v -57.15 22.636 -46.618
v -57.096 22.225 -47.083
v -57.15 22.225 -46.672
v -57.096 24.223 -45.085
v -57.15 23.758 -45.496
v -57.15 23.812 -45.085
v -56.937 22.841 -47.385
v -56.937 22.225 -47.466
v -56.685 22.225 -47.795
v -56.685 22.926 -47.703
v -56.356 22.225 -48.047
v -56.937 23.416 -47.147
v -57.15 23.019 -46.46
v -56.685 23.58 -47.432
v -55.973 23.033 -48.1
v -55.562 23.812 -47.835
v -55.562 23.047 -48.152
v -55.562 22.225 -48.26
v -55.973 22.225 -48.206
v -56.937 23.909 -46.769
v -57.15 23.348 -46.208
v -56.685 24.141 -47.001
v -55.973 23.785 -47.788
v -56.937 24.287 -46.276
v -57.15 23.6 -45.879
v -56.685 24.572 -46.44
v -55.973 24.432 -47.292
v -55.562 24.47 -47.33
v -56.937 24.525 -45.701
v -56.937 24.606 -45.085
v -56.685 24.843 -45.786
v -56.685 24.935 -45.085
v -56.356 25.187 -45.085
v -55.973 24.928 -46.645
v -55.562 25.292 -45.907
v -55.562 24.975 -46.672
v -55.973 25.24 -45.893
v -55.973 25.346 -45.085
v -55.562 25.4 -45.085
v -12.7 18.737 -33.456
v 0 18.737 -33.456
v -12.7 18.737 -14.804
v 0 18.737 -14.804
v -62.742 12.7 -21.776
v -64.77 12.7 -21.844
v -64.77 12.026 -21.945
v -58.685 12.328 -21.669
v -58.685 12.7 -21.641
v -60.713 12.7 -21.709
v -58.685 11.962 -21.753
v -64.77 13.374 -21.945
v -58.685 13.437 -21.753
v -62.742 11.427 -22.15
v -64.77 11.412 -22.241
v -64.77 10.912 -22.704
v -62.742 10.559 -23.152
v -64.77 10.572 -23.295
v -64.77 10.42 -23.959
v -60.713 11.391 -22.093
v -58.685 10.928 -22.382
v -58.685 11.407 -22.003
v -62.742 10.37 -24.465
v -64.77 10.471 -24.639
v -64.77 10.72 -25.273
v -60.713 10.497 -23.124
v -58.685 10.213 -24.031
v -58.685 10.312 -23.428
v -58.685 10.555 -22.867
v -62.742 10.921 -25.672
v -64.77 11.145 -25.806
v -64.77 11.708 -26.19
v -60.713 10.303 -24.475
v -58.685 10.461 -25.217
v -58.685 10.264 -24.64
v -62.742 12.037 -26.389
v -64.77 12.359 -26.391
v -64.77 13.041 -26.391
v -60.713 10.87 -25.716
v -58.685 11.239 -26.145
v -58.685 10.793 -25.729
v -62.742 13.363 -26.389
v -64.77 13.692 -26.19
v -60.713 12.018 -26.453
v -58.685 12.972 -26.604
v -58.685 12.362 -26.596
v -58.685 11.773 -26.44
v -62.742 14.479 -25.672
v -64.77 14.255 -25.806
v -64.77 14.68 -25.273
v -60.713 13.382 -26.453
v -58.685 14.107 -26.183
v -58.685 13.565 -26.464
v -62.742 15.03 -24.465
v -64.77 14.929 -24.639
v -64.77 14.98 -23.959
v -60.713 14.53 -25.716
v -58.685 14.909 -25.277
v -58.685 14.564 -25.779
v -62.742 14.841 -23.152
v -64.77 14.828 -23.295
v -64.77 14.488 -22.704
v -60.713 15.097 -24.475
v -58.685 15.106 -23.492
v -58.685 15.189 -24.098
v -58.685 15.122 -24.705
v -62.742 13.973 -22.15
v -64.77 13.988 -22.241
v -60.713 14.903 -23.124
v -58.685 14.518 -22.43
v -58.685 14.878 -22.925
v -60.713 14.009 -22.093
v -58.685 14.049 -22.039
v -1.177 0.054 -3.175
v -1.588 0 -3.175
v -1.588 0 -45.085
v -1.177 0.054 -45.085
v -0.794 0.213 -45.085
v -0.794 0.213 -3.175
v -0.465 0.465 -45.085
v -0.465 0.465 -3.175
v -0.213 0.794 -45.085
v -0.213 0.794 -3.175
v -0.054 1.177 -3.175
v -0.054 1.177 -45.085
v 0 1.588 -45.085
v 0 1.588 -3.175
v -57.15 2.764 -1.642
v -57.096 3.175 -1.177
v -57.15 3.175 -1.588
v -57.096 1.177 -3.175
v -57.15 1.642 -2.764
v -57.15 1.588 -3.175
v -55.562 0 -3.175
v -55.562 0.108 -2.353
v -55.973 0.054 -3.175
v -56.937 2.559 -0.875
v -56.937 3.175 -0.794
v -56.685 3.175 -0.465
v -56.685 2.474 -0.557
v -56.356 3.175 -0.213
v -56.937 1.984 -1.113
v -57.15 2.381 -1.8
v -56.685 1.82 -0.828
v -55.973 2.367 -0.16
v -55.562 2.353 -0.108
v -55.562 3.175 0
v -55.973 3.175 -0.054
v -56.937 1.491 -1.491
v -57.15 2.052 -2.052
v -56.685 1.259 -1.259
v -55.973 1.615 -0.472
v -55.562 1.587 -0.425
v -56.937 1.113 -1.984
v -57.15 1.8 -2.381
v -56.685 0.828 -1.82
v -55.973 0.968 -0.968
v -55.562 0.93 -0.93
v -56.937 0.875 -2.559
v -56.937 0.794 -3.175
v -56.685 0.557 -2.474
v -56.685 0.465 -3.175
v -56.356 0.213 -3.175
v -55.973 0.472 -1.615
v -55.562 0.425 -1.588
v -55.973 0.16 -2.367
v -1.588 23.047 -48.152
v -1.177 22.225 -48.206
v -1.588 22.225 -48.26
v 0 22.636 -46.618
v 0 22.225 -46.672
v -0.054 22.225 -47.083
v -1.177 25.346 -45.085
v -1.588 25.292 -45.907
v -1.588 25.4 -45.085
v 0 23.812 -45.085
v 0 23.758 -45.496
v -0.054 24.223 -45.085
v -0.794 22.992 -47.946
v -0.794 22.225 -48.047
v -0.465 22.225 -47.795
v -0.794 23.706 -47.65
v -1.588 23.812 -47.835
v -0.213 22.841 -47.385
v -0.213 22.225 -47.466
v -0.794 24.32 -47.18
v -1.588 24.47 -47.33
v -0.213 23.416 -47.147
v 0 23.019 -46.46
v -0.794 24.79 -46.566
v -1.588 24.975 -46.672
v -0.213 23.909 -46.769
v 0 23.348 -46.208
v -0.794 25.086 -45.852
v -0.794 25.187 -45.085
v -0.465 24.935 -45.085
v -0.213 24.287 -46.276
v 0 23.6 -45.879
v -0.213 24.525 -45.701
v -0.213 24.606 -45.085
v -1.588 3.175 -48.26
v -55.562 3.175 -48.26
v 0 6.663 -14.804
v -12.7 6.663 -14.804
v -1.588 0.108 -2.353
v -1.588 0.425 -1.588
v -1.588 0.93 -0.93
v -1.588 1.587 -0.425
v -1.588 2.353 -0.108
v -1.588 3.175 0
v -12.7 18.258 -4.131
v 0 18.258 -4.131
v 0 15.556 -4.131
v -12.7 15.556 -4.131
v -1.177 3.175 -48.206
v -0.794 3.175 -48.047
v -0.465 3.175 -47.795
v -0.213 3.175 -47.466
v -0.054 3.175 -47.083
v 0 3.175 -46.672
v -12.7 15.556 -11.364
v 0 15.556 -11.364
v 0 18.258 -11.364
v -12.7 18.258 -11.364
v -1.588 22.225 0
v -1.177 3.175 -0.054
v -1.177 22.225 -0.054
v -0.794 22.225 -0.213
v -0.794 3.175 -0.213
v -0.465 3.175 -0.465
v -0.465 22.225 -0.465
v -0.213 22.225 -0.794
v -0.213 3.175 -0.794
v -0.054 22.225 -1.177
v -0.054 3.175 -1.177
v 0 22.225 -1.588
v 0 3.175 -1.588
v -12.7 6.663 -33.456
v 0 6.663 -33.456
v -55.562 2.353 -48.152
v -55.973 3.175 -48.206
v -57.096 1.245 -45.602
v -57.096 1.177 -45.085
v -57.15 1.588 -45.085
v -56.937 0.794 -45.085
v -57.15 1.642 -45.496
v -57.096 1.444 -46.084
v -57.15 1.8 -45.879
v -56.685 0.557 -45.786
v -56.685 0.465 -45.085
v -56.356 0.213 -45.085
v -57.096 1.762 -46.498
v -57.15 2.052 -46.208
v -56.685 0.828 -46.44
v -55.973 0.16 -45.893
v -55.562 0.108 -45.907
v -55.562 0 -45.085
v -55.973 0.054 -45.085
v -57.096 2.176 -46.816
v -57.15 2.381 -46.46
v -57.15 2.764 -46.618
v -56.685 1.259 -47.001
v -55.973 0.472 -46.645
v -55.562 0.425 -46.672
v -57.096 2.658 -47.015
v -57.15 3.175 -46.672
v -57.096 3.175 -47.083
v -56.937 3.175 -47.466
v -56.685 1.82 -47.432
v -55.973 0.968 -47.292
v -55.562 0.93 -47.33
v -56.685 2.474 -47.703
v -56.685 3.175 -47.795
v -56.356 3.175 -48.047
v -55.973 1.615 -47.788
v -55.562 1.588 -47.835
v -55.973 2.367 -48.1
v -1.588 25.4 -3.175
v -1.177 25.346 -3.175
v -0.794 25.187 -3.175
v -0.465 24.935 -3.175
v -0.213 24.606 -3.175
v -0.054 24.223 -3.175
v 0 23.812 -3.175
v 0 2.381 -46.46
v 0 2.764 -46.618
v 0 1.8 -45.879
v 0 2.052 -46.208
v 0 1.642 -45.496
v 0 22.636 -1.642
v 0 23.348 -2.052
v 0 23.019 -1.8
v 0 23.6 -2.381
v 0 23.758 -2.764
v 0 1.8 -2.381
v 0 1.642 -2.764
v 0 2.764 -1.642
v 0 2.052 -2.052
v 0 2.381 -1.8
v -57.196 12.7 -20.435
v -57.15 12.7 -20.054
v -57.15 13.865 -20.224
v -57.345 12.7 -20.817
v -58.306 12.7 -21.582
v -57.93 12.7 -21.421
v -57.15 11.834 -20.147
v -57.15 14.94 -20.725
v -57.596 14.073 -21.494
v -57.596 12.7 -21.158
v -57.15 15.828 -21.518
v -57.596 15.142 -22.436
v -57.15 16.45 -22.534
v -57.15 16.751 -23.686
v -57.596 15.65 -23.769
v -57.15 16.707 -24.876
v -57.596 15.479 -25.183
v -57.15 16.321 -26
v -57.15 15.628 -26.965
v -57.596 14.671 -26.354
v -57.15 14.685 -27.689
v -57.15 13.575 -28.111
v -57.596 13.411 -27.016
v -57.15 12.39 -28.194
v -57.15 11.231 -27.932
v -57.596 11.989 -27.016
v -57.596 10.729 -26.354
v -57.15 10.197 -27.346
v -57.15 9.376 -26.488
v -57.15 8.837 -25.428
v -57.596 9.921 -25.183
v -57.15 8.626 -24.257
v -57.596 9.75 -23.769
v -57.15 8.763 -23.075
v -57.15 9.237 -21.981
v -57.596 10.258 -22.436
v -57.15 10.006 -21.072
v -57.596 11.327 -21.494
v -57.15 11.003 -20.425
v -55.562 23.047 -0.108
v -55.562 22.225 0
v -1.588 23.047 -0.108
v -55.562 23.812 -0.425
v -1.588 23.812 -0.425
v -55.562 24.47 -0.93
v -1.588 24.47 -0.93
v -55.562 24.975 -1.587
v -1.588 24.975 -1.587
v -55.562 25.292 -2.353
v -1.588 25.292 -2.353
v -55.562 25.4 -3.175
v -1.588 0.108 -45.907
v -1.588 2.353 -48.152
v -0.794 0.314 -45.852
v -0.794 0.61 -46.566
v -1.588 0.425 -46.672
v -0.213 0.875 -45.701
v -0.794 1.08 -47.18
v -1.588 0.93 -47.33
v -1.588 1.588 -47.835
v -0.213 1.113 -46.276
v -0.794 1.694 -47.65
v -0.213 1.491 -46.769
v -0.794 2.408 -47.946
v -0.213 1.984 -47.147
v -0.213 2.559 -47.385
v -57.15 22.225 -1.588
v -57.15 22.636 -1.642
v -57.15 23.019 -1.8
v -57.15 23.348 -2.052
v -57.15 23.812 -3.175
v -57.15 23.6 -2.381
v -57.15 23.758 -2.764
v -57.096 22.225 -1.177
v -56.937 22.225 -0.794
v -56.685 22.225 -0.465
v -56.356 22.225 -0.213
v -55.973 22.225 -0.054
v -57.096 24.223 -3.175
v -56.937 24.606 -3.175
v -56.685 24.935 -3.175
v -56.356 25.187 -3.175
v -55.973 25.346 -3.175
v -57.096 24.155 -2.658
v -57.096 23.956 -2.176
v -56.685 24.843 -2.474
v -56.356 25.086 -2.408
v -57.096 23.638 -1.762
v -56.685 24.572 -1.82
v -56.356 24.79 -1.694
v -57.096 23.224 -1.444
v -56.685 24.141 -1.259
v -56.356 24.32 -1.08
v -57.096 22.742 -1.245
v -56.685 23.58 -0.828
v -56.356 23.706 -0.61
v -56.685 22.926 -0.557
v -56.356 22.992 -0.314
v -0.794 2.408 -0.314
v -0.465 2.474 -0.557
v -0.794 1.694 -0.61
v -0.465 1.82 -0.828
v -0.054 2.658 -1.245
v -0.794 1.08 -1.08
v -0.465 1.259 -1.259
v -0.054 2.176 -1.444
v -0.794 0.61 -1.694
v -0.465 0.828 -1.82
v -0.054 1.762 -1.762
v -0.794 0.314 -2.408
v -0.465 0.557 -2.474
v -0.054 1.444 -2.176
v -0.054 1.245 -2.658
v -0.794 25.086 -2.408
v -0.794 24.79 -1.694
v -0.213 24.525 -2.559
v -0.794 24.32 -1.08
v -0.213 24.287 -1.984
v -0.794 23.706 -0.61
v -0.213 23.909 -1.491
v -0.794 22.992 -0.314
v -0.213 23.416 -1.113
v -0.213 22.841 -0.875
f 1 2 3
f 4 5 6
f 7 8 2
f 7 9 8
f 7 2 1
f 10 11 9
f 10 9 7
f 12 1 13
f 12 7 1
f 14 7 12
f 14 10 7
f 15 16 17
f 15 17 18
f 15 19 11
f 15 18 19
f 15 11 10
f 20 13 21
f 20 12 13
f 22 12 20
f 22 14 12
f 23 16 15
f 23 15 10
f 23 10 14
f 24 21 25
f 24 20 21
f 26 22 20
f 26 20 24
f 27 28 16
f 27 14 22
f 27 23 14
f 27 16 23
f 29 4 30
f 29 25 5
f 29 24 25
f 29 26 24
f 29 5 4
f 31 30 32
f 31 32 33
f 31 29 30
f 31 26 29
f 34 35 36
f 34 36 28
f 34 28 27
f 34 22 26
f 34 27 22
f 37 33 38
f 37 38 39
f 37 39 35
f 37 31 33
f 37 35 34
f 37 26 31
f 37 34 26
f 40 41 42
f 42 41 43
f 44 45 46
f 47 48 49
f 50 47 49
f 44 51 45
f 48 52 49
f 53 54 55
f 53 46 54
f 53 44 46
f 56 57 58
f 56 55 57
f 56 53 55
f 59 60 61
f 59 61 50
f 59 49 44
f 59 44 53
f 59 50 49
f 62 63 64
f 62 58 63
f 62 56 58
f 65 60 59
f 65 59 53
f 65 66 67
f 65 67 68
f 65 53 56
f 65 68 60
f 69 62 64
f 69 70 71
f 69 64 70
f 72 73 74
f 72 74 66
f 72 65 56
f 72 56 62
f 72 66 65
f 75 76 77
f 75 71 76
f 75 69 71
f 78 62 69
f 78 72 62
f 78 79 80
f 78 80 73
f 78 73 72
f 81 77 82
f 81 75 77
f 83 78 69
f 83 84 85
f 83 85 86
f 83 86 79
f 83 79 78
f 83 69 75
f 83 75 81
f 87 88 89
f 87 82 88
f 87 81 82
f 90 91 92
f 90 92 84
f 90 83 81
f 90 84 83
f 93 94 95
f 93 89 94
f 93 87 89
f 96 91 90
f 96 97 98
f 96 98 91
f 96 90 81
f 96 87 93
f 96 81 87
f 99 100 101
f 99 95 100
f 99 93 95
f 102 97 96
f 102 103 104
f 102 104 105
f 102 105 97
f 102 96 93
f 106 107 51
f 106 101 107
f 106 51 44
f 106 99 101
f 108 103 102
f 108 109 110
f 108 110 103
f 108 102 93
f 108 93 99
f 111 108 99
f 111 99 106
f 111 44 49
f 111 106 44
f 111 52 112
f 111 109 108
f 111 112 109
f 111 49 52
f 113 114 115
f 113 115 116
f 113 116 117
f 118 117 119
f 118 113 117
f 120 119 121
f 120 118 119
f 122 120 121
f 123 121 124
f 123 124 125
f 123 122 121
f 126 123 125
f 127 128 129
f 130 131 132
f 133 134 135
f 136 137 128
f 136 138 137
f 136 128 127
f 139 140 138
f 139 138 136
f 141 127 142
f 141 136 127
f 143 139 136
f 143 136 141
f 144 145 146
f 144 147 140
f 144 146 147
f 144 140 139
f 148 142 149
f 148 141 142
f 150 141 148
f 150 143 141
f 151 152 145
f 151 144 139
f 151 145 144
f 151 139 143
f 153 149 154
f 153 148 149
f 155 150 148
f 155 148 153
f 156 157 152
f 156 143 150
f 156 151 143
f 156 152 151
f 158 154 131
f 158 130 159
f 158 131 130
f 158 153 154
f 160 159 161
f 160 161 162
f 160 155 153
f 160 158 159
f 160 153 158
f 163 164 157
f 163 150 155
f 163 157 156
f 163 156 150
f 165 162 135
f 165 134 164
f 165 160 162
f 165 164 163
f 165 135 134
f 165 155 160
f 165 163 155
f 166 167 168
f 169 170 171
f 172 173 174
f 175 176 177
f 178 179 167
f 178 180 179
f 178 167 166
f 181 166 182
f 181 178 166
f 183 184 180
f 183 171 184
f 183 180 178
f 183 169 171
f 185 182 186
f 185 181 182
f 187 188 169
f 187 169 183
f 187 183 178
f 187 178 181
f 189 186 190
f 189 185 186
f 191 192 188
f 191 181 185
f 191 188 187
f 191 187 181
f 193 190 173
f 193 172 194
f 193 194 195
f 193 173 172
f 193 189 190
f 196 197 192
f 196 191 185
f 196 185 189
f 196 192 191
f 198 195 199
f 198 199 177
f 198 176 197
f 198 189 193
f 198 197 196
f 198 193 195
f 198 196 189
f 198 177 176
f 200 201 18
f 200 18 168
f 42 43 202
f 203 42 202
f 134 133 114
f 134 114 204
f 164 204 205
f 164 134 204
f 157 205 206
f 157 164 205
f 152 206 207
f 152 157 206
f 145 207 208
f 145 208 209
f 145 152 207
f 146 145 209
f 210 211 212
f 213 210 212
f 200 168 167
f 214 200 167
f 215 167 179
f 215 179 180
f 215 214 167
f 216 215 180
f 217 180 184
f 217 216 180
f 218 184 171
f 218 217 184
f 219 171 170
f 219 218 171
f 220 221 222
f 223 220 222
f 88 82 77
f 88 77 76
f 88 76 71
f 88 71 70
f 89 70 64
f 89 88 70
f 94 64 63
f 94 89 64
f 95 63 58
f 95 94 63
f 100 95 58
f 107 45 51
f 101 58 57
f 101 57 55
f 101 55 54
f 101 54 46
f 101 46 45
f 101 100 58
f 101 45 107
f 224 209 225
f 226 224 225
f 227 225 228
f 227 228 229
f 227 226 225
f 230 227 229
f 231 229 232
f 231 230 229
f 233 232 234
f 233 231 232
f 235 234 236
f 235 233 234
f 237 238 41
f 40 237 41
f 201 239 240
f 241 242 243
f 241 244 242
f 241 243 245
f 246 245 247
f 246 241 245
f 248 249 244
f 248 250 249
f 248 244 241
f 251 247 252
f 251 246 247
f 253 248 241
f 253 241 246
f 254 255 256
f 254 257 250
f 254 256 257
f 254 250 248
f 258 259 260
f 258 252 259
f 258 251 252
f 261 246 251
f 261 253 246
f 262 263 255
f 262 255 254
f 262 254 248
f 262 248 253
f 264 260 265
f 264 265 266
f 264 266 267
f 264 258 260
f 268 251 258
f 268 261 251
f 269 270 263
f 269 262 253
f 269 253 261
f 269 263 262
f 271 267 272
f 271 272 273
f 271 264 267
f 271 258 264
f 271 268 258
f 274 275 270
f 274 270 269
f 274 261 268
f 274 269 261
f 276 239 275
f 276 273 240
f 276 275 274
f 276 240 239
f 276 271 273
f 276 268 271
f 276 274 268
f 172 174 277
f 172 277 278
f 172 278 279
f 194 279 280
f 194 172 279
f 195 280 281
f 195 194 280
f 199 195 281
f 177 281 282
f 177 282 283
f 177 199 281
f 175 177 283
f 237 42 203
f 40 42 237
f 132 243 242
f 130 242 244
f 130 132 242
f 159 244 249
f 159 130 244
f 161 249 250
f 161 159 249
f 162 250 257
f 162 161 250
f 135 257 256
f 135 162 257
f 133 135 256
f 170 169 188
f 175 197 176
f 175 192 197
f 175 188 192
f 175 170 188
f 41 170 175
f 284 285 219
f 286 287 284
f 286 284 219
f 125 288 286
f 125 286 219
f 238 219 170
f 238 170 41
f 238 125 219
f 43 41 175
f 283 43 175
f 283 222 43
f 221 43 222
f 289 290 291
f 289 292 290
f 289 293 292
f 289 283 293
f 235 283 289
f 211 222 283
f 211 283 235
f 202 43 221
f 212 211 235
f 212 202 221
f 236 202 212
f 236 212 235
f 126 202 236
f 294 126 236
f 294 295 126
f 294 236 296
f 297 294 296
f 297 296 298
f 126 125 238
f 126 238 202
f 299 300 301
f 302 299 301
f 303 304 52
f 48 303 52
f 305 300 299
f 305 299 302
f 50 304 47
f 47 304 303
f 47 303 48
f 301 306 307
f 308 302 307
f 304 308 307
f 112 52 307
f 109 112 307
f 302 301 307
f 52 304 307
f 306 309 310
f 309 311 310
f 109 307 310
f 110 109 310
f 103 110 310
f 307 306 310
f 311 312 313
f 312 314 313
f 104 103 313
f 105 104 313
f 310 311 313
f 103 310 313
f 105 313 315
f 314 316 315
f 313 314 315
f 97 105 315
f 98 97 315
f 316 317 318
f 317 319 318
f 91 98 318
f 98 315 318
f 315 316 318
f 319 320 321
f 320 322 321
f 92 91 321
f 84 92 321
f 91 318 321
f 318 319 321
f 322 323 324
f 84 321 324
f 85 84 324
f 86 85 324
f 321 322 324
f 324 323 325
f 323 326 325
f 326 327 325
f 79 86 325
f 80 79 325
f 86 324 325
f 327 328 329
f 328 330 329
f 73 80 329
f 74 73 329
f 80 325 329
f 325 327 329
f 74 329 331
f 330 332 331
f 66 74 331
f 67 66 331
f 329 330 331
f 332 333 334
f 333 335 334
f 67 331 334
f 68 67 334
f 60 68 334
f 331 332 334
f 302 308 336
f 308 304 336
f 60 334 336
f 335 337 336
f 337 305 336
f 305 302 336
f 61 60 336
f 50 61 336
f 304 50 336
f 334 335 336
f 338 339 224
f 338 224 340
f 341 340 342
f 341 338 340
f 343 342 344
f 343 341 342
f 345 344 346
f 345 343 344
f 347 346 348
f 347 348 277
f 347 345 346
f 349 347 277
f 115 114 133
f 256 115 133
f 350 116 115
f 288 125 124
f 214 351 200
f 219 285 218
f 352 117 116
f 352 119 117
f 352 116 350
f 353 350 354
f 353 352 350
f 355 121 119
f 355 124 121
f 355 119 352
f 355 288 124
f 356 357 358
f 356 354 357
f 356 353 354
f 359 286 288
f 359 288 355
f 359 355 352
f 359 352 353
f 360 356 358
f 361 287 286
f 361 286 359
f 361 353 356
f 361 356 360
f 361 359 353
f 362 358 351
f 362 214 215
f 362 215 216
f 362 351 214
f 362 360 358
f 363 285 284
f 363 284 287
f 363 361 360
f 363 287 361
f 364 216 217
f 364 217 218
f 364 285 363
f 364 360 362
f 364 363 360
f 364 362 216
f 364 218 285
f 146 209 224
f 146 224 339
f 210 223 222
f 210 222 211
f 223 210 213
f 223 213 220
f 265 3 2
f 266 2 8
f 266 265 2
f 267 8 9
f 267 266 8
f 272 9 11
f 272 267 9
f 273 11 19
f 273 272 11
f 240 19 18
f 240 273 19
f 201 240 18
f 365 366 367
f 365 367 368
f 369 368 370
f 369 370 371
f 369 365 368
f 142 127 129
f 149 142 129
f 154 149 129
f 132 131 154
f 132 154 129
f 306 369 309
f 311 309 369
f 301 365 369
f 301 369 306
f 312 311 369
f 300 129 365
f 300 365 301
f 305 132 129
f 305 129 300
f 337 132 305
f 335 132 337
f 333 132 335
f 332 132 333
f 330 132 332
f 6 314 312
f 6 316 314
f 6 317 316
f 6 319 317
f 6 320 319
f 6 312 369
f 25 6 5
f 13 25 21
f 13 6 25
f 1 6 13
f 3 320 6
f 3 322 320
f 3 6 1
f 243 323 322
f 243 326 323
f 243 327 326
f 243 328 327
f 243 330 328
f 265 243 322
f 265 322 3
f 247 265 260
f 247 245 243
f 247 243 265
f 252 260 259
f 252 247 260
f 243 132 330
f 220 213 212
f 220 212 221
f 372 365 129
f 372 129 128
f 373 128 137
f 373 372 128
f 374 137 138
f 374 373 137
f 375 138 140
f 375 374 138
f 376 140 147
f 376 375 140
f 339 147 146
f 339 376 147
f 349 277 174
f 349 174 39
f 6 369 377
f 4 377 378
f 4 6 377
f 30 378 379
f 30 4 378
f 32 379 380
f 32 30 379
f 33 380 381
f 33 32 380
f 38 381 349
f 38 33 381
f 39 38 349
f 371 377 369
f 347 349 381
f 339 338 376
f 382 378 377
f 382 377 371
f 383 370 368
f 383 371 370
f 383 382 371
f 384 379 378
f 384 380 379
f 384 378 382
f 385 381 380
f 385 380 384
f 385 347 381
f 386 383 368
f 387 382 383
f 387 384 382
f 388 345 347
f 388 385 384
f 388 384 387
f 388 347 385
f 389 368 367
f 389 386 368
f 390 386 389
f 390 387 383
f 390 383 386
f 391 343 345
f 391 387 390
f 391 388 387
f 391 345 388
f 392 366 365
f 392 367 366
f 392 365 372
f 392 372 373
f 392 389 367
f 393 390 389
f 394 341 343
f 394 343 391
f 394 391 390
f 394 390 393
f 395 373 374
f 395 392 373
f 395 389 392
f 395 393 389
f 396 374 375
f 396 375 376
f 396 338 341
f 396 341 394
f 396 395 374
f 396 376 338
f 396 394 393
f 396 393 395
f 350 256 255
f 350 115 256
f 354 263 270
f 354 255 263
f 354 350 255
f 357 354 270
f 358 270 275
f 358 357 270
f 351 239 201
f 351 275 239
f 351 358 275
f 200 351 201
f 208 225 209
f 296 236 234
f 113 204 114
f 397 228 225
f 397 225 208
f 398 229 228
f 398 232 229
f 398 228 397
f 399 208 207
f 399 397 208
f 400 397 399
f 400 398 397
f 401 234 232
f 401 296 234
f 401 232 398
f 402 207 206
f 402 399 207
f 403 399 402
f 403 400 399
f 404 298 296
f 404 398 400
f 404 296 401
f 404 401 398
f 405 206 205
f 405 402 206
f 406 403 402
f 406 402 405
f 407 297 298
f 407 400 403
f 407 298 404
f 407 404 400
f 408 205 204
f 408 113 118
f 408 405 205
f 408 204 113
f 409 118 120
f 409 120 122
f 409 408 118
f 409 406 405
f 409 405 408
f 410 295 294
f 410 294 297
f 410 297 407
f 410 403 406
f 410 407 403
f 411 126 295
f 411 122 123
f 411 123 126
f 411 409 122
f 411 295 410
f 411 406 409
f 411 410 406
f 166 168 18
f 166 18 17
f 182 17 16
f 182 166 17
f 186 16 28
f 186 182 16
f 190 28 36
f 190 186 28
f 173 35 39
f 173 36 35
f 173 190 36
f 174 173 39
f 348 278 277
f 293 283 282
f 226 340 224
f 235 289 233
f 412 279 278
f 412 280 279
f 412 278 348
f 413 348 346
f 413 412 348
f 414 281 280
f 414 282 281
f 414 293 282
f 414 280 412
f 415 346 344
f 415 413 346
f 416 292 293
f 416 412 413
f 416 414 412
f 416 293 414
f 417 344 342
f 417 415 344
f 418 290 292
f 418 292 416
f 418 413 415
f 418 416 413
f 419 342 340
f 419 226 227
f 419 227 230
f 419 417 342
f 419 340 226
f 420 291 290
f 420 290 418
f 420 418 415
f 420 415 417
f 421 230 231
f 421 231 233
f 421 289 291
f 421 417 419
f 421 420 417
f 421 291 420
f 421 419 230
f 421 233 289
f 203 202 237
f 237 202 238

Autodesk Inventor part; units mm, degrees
ref_plane "YZ Plane" through (0, 0, 0) normal (1, 0, 0) x (0, 1, 0)
ref_plane "XZ Plane" through (0, 0, 0) normal (0, 1, 0) x (-1, 0, 0)
ref_plane "XY Plane" through (0, 0, 0) normal (0, 0, 1) x (1, 0, 0)
sketch "Sketch1" plane through (0, 0, 0) normal (0, 1, 0) x (-1, 0, 0)
  line L0 (0, 0) -> (57.15, 0)
  line L1 (57.15, 0) -> (57.15, -48.26)
  line L2 (57.15, -48.26) -> (0, -48.26)
  line L3 (0, -48.26) -> (0, 0)
  dimension "d0" = 57.15
  dimension "d1" = 48.26
extrude "Extrusion1" add sketch "Sketch1" along normal blind 25.4
sketch "Sketch2" plane through (0, 0, 0) normal (1, 0, 0) x (0, 0, -1)
  line L0 (0, 0) -> (48.26, 0) construction
  line L1 (48.26, 0) -> (48.26, 25.4) construction
  line L2 (0, 25.4) -> (48.26, 25.4) construction
  line L3 (0, 0) -> (0, 25.4) construction
  line L4 (14.8042, 6.663) -> (33.4558, 6.663)
  line L5 (33.4558, 6.663) -> (33.4558, 18.737)
  line L6 (33.4558, 18.737) -> (14.8042, 18.737)
  line L7 (14.8042, 18.737) -> (14.8042, 6.663)
  line L8 (14.8042, 6.663) -> (33.4558, 18.737) construction
  line L9 (33.4558, 6.663) -> (14.8042, 18.737) construction
  line L10 (4.1311, 15.5562) -> (11.3642, 15.5562)
  line L11 (11.3642, 15.5562) -> (11.3642, 18.2577)
  line L12 (11.3642, 18.2577) -> (4.1311, 18.2577)
  line L13 (4.1311, 18.2577) -> (4.1311, 15.5562)
  line L14 (4.1311, 15.5562) -> (11.3642, 18.2577) construction
  line L15 (11.3642, 15.5562) -> (4.1311, 18.2577) construction
  point P0 (24.13, 12.7)
  point P1 (7.7477, 16.9069)
extrude "Extrusion2" cut sketch "Sketch2" against normal blind 12.7
sketch "Sketch3" plane through (-57.15, 0, -48.26) normal (-1, 0, 0) x (0, 0, 1)
  line L0 (0, 0) -> (48.26, 0) projected
  line L1 (48.26, 0) -> (48.26, 25.4) projected
  line L2 (0, 25.4) -> (48.26, 25.4) projected
  line L3 (0, 0) -> (0, 25.4) projected
  circle A0 centre (24.13, 12.7) radius 2.54
  dimension "d6" = 5.08
extrude "Extrusion3" add sketch "Sketch3" along normal blind 7.62 contours A0
chamfer "Chamfer1" distance 0.254 distance2 7.62 1 edges at (-64.77, 12.7, -26.67) measured on face at (-64.77, 13.2614, -23.2922)
fillet "Fillet1" radius 3.175 4 edges at (-28.575, 25.4, -48.26) (-28.575, 0, -48.26) (-28.575, 0, 0) (-28.575, 25.4, 0)
fillet "Fillet2" radius 1.5875 18 edges at (0, 24.4701, -47.3301) (0, 12.7, -48.26) (0, 0.9299, -47.3301) (0, 0, -24.13) (0, 0.9299, -0.9299) (0, 12.7, 0) (0, 24.4701, -0.9299) (0, 25.4, -24.13) (-57.15, 24.4701, -0.9299) (-57.15, 12.7, 0) (-57.15, 0.9299, -0.9299) (-57.15, 0, -24.13) (-57.15, 0.9299, -47.3301) (-57.15, 12.7, -48.26) (-57.15, 24.4701, -47.3301) (-57.15, 25.4, -24.13) (-57.15, 12.7, -26.67) (-57.1505, 12.7, -26.67)
properties part number "PoEbox"
